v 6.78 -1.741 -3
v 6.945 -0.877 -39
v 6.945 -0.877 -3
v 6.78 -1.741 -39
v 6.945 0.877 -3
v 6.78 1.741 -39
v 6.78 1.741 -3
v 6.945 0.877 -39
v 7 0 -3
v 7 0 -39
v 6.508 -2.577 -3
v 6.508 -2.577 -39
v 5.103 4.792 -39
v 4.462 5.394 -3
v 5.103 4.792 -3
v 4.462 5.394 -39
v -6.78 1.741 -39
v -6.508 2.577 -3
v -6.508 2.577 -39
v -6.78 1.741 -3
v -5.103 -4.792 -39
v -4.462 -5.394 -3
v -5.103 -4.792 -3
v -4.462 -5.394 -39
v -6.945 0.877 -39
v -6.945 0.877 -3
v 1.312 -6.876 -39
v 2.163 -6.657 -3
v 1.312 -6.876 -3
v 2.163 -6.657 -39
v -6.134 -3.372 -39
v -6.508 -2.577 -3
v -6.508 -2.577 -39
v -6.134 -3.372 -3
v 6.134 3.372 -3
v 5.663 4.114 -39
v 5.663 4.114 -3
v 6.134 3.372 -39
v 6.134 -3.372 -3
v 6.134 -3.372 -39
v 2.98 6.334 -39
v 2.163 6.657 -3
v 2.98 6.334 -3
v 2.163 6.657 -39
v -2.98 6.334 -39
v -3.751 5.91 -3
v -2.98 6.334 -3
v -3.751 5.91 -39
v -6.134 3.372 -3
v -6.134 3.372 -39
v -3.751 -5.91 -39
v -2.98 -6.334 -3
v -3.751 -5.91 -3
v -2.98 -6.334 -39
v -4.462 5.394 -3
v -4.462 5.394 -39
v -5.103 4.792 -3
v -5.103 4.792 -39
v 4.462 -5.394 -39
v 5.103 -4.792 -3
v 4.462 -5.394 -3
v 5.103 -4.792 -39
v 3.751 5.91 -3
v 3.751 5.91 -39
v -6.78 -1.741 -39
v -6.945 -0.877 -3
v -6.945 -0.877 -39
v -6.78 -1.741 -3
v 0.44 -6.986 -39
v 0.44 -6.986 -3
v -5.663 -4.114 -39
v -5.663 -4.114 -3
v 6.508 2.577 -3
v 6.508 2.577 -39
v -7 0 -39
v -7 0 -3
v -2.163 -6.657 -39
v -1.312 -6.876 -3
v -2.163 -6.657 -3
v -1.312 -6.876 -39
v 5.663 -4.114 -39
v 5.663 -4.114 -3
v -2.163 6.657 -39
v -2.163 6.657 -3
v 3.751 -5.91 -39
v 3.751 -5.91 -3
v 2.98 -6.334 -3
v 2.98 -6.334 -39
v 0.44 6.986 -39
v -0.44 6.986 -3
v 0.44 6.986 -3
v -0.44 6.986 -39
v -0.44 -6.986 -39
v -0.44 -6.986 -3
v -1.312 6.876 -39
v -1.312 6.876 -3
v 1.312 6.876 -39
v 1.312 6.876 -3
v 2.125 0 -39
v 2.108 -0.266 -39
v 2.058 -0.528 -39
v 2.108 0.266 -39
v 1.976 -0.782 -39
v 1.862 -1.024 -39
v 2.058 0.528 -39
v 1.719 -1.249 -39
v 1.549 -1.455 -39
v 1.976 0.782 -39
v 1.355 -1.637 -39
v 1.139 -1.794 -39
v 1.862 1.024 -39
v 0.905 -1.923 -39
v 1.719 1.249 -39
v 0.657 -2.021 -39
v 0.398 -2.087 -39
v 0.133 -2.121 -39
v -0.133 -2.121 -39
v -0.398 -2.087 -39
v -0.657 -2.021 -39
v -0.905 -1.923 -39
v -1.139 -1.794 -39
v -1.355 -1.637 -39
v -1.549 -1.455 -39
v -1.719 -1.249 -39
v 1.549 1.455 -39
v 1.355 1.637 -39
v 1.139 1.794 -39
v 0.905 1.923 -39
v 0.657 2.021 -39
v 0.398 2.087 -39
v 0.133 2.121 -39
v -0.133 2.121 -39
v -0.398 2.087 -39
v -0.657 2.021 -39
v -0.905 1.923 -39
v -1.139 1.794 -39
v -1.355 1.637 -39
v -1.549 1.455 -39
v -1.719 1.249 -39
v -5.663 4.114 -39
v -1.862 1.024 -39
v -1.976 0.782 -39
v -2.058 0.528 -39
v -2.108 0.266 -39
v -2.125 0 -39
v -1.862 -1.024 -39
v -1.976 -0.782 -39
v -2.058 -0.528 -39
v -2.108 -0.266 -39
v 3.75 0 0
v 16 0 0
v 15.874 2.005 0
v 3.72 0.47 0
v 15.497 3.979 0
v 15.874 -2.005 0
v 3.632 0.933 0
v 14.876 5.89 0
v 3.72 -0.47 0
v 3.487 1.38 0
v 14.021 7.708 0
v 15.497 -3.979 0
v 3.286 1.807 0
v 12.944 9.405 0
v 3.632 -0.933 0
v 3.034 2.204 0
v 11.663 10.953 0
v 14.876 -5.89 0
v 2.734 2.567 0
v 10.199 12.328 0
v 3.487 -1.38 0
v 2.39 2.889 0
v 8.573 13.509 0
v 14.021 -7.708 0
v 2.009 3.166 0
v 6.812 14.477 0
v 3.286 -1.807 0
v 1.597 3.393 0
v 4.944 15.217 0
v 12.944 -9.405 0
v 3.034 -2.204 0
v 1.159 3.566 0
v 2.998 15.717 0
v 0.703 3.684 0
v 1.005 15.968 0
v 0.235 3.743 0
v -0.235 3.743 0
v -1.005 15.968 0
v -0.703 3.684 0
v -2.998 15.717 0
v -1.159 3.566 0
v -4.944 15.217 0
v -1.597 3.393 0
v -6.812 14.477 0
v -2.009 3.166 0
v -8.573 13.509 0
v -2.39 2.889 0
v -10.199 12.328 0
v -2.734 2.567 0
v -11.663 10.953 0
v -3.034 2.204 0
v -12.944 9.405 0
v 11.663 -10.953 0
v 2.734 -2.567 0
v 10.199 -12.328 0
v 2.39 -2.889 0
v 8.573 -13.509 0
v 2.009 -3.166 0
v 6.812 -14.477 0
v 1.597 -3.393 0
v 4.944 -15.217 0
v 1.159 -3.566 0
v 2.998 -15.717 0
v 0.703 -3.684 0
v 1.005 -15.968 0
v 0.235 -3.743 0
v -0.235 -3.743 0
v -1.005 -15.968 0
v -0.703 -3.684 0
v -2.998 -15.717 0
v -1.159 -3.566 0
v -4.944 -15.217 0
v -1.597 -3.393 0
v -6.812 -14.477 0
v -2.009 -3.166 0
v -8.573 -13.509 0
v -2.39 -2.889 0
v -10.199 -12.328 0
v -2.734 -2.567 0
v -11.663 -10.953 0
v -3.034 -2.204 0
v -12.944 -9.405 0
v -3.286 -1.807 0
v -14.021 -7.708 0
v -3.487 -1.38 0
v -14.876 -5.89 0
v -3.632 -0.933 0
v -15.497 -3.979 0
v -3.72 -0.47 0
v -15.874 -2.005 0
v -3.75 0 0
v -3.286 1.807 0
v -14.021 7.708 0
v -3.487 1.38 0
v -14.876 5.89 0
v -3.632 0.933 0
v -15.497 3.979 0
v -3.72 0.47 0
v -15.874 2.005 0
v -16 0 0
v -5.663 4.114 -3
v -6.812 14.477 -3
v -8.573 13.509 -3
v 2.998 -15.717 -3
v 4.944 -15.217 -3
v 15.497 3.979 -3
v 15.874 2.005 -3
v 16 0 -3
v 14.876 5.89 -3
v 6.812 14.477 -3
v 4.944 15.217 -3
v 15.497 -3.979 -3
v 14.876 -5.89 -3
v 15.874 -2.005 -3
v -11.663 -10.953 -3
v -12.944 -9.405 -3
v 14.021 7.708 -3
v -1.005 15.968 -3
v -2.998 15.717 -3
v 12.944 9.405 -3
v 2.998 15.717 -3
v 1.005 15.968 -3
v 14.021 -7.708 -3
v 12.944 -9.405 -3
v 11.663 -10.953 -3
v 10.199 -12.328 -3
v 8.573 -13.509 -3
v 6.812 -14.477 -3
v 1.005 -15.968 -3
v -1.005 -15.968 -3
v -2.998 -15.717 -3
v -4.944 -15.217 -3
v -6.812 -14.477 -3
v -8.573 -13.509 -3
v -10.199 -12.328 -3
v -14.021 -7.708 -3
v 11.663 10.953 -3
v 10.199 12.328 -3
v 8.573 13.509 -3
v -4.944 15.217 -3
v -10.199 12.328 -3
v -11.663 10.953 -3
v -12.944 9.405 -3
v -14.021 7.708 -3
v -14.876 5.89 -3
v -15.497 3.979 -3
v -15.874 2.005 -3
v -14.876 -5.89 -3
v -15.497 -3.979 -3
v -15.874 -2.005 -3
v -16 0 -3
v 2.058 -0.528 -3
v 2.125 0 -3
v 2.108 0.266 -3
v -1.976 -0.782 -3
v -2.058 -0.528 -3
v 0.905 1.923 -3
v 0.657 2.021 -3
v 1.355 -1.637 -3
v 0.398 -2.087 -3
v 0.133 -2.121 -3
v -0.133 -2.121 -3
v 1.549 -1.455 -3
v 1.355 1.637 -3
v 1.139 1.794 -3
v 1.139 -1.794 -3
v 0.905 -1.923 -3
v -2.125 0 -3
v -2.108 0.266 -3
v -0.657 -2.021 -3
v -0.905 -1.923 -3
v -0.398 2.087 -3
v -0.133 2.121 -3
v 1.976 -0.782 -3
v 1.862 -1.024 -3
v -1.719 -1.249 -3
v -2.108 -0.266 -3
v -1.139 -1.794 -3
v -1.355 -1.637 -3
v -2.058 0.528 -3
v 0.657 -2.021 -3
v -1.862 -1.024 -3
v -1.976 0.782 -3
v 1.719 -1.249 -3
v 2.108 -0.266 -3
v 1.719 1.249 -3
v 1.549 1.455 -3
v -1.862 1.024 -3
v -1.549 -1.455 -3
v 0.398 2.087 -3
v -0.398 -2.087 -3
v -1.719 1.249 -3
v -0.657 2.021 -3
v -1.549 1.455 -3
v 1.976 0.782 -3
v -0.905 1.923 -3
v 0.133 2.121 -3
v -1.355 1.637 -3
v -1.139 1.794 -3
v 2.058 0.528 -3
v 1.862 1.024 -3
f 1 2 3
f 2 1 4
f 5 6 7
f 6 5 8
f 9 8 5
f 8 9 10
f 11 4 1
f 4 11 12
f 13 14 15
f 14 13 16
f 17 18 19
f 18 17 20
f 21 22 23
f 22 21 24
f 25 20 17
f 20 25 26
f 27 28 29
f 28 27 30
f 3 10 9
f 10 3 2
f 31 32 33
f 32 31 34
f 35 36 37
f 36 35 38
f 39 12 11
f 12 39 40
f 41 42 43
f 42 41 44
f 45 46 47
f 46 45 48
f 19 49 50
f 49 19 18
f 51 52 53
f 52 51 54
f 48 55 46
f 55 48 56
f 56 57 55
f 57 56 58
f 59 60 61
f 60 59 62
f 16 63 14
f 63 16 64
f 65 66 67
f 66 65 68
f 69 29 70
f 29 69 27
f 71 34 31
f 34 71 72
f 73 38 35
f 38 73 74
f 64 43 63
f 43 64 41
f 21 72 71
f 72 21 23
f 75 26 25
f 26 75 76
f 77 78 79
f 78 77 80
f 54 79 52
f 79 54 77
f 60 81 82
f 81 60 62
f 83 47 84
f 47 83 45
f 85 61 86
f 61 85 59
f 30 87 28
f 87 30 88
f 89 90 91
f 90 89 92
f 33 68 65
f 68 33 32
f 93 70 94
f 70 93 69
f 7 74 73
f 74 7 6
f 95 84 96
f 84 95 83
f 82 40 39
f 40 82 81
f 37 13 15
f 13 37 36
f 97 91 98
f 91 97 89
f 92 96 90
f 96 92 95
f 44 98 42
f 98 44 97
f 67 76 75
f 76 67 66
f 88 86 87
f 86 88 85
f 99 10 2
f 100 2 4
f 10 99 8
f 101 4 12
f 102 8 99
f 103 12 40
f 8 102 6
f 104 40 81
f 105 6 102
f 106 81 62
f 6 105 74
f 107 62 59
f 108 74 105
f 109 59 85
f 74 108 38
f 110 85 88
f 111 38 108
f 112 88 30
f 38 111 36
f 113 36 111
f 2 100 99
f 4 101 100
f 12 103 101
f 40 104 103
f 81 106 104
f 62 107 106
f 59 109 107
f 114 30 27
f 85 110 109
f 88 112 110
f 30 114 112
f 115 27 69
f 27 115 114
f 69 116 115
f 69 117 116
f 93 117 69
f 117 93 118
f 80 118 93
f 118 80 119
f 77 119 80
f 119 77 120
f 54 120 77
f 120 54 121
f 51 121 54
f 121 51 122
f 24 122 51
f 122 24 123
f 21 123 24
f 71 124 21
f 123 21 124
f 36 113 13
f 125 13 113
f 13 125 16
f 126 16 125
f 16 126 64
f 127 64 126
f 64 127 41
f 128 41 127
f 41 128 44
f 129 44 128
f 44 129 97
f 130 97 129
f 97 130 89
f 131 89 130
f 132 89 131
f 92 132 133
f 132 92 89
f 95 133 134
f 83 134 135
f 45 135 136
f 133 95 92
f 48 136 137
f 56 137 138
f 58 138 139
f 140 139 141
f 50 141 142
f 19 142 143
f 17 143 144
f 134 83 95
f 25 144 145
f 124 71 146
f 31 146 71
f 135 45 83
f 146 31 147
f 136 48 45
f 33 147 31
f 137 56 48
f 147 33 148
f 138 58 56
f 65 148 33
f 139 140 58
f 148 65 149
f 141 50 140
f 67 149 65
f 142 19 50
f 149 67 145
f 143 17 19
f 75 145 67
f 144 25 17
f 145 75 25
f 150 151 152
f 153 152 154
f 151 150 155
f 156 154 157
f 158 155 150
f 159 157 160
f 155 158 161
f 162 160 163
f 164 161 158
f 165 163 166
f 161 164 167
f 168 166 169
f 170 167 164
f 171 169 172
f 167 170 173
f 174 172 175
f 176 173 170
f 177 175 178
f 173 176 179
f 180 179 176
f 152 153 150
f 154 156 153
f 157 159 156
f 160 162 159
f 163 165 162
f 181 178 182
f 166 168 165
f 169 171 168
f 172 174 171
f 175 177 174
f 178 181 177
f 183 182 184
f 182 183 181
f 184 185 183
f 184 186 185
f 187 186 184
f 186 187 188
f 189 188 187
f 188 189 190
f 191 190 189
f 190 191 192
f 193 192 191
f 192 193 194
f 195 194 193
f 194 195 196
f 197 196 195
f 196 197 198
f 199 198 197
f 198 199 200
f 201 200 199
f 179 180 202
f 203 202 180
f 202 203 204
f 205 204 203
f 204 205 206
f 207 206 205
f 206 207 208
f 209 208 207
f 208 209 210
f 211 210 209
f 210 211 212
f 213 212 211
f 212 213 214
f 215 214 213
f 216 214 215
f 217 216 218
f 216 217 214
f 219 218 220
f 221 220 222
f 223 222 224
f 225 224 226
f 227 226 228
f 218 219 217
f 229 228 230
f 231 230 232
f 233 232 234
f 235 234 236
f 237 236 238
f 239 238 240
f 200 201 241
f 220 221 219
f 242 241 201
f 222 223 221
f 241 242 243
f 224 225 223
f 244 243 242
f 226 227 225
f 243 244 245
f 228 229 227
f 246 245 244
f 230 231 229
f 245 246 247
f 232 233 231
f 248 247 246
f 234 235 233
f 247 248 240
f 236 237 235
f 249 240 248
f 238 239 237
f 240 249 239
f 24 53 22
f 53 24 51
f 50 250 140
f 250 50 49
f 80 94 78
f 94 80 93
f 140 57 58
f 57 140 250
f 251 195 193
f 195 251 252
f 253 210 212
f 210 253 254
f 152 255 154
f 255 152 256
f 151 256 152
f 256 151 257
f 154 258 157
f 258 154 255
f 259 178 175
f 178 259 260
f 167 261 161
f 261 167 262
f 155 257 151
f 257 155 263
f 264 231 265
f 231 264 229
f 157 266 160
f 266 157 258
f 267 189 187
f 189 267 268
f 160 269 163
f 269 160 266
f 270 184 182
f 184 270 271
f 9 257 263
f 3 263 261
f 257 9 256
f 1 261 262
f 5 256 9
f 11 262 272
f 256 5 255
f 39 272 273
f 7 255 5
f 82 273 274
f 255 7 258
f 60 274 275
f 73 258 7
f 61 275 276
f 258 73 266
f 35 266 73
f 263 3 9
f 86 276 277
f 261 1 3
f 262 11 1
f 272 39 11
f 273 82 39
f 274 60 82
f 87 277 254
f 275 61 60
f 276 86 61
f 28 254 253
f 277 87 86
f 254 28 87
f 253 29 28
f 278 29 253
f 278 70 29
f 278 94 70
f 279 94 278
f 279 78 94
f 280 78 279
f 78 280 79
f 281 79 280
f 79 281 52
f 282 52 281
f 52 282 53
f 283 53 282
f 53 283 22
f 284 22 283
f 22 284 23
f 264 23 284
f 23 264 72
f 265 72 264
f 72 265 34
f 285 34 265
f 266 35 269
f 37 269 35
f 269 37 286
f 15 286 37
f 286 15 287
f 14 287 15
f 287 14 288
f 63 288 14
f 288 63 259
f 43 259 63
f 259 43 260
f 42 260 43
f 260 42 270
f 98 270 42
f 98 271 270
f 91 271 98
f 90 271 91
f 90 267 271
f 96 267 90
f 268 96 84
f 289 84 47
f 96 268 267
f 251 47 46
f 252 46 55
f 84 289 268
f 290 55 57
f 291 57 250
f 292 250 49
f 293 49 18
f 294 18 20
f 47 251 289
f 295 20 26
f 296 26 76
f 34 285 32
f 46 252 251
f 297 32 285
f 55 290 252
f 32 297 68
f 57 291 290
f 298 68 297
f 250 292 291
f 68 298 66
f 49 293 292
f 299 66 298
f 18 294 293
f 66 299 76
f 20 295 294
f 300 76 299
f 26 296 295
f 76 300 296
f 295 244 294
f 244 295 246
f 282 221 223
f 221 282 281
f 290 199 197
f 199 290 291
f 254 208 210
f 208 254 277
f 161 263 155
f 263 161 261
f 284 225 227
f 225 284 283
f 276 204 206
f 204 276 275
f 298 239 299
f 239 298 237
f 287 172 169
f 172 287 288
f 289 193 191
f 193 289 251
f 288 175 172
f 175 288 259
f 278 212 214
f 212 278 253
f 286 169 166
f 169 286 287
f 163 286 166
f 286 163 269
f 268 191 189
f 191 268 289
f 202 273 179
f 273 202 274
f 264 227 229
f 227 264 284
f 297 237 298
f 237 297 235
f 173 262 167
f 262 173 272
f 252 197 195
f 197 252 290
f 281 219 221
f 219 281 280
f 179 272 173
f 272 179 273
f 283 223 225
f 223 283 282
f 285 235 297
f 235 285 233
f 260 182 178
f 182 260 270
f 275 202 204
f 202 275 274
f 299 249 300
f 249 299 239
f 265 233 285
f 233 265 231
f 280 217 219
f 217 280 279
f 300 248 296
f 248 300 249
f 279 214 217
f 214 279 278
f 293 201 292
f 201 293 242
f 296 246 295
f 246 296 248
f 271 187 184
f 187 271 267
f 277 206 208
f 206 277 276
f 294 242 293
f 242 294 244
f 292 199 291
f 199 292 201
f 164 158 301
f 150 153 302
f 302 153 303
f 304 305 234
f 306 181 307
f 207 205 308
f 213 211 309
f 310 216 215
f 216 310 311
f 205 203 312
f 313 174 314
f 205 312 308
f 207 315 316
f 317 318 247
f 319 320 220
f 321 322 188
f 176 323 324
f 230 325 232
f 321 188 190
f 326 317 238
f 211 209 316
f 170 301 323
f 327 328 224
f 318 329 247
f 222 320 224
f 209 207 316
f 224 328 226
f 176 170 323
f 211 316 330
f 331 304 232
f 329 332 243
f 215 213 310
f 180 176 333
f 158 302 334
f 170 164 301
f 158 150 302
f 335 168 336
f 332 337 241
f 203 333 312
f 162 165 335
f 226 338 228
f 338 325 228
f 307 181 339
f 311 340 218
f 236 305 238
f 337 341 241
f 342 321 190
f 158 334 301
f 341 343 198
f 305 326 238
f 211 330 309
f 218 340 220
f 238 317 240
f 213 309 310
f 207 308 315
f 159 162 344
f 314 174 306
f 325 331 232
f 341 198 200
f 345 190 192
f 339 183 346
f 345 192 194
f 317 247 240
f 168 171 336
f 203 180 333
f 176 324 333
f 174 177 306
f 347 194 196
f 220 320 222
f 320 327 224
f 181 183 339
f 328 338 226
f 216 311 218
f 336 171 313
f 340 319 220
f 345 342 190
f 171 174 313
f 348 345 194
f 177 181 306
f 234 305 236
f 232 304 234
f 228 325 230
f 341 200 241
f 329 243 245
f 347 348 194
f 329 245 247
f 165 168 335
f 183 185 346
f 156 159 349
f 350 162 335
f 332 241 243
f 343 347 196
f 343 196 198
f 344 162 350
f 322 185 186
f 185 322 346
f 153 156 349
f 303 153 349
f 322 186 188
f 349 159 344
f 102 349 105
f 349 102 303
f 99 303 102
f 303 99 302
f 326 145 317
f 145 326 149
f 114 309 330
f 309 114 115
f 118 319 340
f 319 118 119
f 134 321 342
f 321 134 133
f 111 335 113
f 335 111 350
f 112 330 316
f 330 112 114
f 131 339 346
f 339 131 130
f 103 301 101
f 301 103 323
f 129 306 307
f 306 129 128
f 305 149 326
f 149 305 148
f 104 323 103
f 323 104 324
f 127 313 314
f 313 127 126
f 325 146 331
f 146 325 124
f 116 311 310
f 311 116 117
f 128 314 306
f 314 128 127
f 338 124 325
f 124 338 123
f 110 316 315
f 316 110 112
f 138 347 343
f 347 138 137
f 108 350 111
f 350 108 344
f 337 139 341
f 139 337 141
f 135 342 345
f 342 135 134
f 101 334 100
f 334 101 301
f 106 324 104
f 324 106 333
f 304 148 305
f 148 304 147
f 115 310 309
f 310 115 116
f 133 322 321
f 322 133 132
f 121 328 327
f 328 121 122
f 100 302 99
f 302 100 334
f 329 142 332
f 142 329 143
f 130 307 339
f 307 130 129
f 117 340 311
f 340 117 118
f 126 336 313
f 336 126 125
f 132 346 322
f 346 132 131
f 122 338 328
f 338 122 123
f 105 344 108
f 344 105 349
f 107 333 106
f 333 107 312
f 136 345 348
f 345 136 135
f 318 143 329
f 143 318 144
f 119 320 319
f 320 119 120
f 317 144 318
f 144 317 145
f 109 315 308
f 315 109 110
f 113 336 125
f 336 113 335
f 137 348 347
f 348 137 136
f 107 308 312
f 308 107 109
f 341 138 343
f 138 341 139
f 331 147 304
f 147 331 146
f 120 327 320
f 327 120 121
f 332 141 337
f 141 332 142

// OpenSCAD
$fn = 50;


difference() {
	union() {
		translate(v = [0, 0, -39.0000000000]) {
			cylinder(h = 39, r = 7.0000000000);
		}
		translate(v = [0, 0, -3.0000000000]) {
			cylinder(h = 3, r = 16.0000000000);
		}
	}
	union() {
		translate(v = [0, 0, 0]) {
			rotate(a = [0, 0, 0]) {
				difference() {
					union() {
						#translate(v = [0, 0, -39.0000000000]) {
							cylinder(h = 39, r = 2.0000000000);
						}
						#translate(v = [0, 0, -3]) {
							cylinder(h = 3, r1 = 2.1250000000, r2 = 3.7500000000);
						}
						#translate(v = [0, 0, -39.0000000000]) {
							cylinder(h = 39, r = 2.1250000000);
						}
						#translate(v = [0, 0, -39.0000000000]) {
							cylinder(h = 39, r = 2.0000000000);
						}
					}
					union();
				}
			}
		}
	}
}
